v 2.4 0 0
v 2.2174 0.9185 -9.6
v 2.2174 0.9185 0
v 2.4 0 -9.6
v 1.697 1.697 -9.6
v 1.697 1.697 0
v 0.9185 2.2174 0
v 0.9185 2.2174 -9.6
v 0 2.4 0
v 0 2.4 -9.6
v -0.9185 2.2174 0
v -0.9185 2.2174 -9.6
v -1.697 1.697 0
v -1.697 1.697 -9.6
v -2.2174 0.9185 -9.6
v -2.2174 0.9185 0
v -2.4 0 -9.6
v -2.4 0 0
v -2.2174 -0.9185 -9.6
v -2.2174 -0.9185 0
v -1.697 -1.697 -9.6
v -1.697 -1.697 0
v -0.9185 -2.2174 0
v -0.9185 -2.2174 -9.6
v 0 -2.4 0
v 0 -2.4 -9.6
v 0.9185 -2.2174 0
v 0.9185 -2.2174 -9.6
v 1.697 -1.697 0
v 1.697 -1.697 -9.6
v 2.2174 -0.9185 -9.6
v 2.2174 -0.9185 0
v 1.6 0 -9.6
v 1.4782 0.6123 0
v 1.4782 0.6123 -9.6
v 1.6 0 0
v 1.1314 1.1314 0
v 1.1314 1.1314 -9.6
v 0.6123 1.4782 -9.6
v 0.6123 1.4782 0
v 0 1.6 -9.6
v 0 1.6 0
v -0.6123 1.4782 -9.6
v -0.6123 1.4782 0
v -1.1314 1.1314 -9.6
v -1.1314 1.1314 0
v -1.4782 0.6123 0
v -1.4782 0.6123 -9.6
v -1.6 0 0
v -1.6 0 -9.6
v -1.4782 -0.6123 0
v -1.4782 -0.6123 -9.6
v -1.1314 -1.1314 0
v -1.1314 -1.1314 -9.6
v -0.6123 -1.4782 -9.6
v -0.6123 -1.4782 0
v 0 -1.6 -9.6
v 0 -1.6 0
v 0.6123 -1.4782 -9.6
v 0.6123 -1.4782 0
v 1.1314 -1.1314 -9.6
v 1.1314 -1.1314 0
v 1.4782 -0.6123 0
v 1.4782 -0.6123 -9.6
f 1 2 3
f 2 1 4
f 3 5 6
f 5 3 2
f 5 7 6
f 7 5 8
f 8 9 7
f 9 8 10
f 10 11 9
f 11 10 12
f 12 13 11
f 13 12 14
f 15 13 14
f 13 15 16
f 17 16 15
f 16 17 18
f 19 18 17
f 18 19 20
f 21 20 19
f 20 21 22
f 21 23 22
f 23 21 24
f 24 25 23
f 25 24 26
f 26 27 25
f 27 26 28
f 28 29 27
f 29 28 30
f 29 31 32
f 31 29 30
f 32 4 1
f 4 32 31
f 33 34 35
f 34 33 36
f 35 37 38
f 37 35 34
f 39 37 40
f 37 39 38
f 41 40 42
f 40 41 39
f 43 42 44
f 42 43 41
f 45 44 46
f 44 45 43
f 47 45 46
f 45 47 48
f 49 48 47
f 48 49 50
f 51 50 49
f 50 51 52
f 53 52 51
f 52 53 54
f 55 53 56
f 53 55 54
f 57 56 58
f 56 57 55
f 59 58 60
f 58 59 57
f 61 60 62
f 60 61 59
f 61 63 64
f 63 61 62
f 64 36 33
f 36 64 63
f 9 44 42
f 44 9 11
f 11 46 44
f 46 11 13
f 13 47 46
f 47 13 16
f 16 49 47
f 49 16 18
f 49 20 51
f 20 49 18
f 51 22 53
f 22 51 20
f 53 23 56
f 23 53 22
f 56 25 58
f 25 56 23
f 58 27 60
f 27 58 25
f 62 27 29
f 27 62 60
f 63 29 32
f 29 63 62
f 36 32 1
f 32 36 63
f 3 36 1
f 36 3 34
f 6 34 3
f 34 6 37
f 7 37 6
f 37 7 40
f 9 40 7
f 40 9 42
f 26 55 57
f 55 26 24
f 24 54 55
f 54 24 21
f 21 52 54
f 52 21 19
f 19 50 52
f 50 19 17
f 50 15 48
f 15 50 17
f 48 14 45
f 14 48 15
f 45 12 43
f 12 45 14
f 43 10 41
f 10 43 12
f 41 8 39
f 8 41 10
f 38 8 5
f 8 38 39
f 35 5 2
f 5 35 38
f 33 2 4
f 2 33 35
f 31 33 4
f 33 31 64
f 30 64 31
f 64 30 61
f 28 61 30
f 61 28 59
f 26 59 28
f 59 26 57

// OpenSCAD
// file: ../p/4-4disc.scad
use <../lib.scad>
$fa=1; $fs=0.2;
function ldraw_lib__4_4disc(realsolid=false) = [
// 0 Disc 1.0
// 0 Name: 4-4disc.dat
// 0 Author: James Jessiman
// 0 !LDRAW_ORG Primitive UPDATE 2002-02
// 0 !LICENSE Licensed under CC BY 2.0 and CC BY 4.0 : see CAreadme.txt
// 
// 0 BFC CERTIFY CCW
  [0,"BFC","CERTIFY"],
  [0,"BFC","CCW"],
// 
// 0 !HISTORY 1998-12-15 [PTadmin] Official Update 1998-10
// 0 !HISTORY 2002-03-23 [sbliss] Added BFC statement
// 0 !HISTORY 2002-04-25 [PTadmin] Official Update 2002-02
// 0 !HISTORY 2007-06-24 [PTadmin] Header formatted for Contributor Agreement
// 0 !HISTORY 2008-07-01 [PTadmin] Official Update 2008-01
// 
// 
// 3 16 0 0 0 1 0 0 0.9239 0 0.3827
  [3,16,0,0,0,1,0,0,0.9239,0,0.3827],
// 3 16 0 0 0 0.9239 0 0.3827 0.7071 0 0.7071
  [3,16,0,0,0,0.9239,0,0.3827,0.7071,0,0.7071],
// 3 16 0 0 0 0.7071 0 0.7071 0.3827 0 0.9239
  [3,16,0,0,0,0.7071,0,0.7071,0.3827,0,0.9239],
// 3 16 0 0 0 0.3827 0 0.9239 0 0 1
  [3,16,0,0,0,0.3827,0,0.9239,0,0,1],
// 3 16 0 0 0 0 0 1 -0.3827 0 0.9239
  [3,16,0,0,0,0,0,1,-0.3827,0,0.9239],
// 3 16 0 0 0 -0.3827 0 0.9239 -0.7071 0 0.7071
  [3,16,0,0,0,-0.3827,0,0.9239,-0.7071,0,0.7071],
// 3 16 0 0 0 -0.7071 0 0.7071 -0.9239 0 0.3827
  [3,16,0,0,0,-0.7071,0,0.7071,-0.9239,0,0.3827],
// 3 16 0 0 0 -0.9239 0 0.3827 -1 0 -0
  [3,16,0,0,0,-0.9239,0,0.3827,-1,0,-0],
// 3 16 0 0 0 -1 0 -0 -0.9239 0 -0.3827
  [3,16,0,0,0,-1,0,-0,-0.9239,0,-0.3827],
// 3 16 0 0 0 -0.9239 0 -0.3827 -0.7071 0 -0.7071
  [3,16,0,0,0,-0.9239,0,-0.3827,-0.7071,0,-0.7071],
// 3 16 0 0 0 -0.7071 0 -0.7071 -0.3827 0 -0.9239
  [3,16,0,0,0,-0.7071,0,-0.7071,-0.3827,0,-0.9239],
// 3 16 0 0 0 -0.3827 0 -0.9239 0 0 -1
  [3,16,0,0,0,-0.3827,0,-0.9239,0,0,-1],
// 3 16 0 0 0 0 0 -1 0.3827 0 -0.9239
  [3,16,0,0,0,0,0,-1,0.3827,0,-0.9239],
// 3 16 0 0 0 0.3827 0 -0.9239 0.7071 0 -0.7071
  [3,16,0,0,0,0.3827,0,-0.9239,0.7071,0,-0.7071],
// 3 16 0 0 0 0.7071 0 -0.7071 0.9239 0 -0.3827
  [3,16,0,0,0,0.7071,0,-0.7071,0.9239,0,-0.3827],
// 3 16 0 0 0 0.9239 0 -0.3827 1 0 0
  [3,16,0,0,0,0.9239,0,-0.3827,1,0,0],
// 0
];
module ldraw_lib__4_4disc(step=0, col=false, unit=2/5, alt=false, line=0.2, solid=!$preview)
    makepoly(ldraw_lib__4_4disc(solid), step=step, col=col, unit=unit, alt=alt, line=line, solid=solid);
ldraw_lib__4_4disc(line=0.2);
// file: ../p/stud3.scad
use <../lib.scad>
use <4-4cyli.scad>
use <4-4disc.scad>
use <4-4edge.scad>
$fa=1; $fs=0.2;
function ldraw_lib__stud3(realsolid=false) = realsolid ? 
    [openscad(translate([0,0,-eps()], o=cylinder(4+eps(), r=4)),2)] : [
// 0 Stud Tube Solid
// 0 Name: stud3.dat
// 0 Author: James Jessiman
// 0 !LDRAW_ORG Primitive UPDATE 2012-01
// 0 !LICENSE Licensed under CC BY 2.0 and CC BY 4.0 : see CAreadme.txt
// 
// 0 BFC CERTIFY CCW
  [0,"BFC","CERTIFY"],
  [0,"BFC","CCW"],
// 
// 0 !HISTORY 2002-04-04 [sbliss] Modified for BFC compliance
// 0 !HISTORY 2002-04-25 [PTadmin] Official Update 2002-02
// 0 !HISTORY 2007-06-24 [PTadmin] Header formatted for Contributor Agreement
// 0 !HISTORY 2008-07-01 [PTadmin] Official Update 2008-01
// 0 !HISTORY 2012-02-16 [Philo] Changed to CCW
// 0 !HISTORY 2012-03-30 [PTadmin] Official Update 2012-01
// 
// 
// 1 16 0 -4 0 4 0 0 0 1 0 0 0 4 4-4edge.dat
  [1,16,0,-4,0,4,0,0,0,1,0,0,0,4, ldraw_lib__4_4edge(realsolid)],
// 1 16 0 0 0 4 0 0 0 1 0 0 0 4 4-4edge.dat
  [1,16,0,0,0,4,0,0,0,1,0,0,0,4, ldraw_lib__4_4edge(realsolid)],
// 1 16 0 -4 0 4 0 0 0 1 0 0 0 4 4-4disc.dat
  [1,16,0,-4,0,4,0,0,0,1,0,0,0,4, ldraw_lib__4_4disc(realsolid)],
// 1 16 0 -4 0 4 0 0 0 4 0 0 0 4 4-4cyli.dat
  [1,16,0,-4,0,4,0,0,0,4,0,0,0,4, ldraw_lib__4_4cyli(realsolid)],
];
module ldraw_lib__stud3(step=0, col=false, unit=2/5, alt=false, line=0.2, solid=!$preview)
    makepoly(ldraw_lib__stud3(solid), step=step, col=col, unit=unit, alt=alt, line=line, solid=solid);
ldraw_lib__stud3(line=0.2);
// file: ../p/stud.scad
use <../lib.scad>
use <4-4cyli.scad>
use <4-4disc.scad>
use <4-4edge.scad>
$fa=1; $fs=0.2;
function ldraw_lib__stud(realsolid=false) = realsolid ? 
    [openscad(translate([0,0,-eps()], o=cylinder(4+eps(), r=6)),2)] : [
// 0 Stud
// 0 Name: stud.dat
// 0 Author: James Jessiman
// 0 !LDRAW_ORG Primitive UPDATE 2012-01
// 0 !LICENSE Licensed under CC BY 2.0 and CC BY 4.0 : see CAreadme.txt
// 
// 0 BFC CERTIFY CCW
  [0,"BFC","CERTIFY"],
  [0,"BFC","CCW"],
// 
// 0 !HISTORY 2002-04-04 [sbliss] Modified for BFC compliance
// 0 !HISTORY 2002-04-25 [PTadmin] Official Update 2002-02
// 0 !HISTORY 2007-06-24 [PTadmin] Header formatted for Contributor Agreement
// 0 !HISTORY 2008-07-01 [PTadmin] Official Update 2008-01
// 0 !HISTORY 2012-02-16 [Philo] Changed to CCW
// 0 !HISTORY 2012-03-30 [PTadmin] Official Update 2012-01
// 
// 
// 1 16 0 0 0 6 0 0 0 1 0 0 0 6 4-4edge.dat
  [1,16,0,0,0,6,0,0,0,1,0,0,0,6, ldraw_lib__4_4edge(realsolid)],
// 1 16 0 -4 0 6 0 0 0 1 0 0 0 6 4-4edge.dat
  [1,16,0,-4,0,6,0,0,0,1,0,0,0,6, ldraw_lib__4_4edge(realsolid)],
// 1 16 0 0 0 6 0 0 0 -4 0 0 0 6 4-4cyli.dat
  [1,16,0,0,0,6,0,0,0,-4,0,0,0,6, ldraw_lib__4_4cyli(realsolid)],
// 1 16 0 -4 0 6 0 0 0 1 0 0 0 6 4-4disc.dat
  [1,16,0,-4,0,6,0,0,0,1,0,0,0,6, ldraw_lib__4_4disc(realsolid)],
];
module ldraw_lib__stud(step=0, col=false, unit=2/5, alt=false, line=0.2, solid=!$preview)
    makepoly(ldraw_lib__stud(solid), step=step, col=col, unit=unit, alt=alt, line=line, solid=solid);
ldraw_lib__stud(line=0.2);
// file: ../p/box5.scad
use <../lib.scad>
$fa=1; $fs=0.2;
function ldraw_lib__box5(realsolid=false) = [
// 0 Box with 5 Faces and All Edges
// 0 Name: box5.dat
// 0 Author: James Jessiman
// 0 !LDRAW_ORG Primitive UPDATE 2012-01
// 0 !LICENSE Licensed under CC BY 2.0 and CC BY 4.0 : see CAreadme.txt
// 
// 0 BFC CERTIFY CCW
  [0,"BFC","CERTIFY"],
  [0,"BFC","CCW"],
// 
// 0 !HISTORY 2002-04-03 [sbliss] Modified for BFC compliance
// 0 !HISTORY 2002-04-25 [PTadmin] Official Update 2002-02
// 0 !HISTORY 2007-06-24 [PTadmin] Header formatted for Contributor Agreement
// 0 !HISTORY 2008-07-01 [PTadmin] Official Update 2008-01
// 0 !HISTORY 2012-02-16 [Philo] Changed to CCW
// 0 !HISTORY 2012-03-30 [PTadmin] Official Update 2012-01
// 
// 
// 2 24 1 1 1 -1 1 1
  [2,24,1,1,1,-1,1,1],
// 2 24 -1 1 1 -1 1 -1
  [2,24,-1,1,1,-1,1,-1],
// 2 24 -1 1 -1 1 1 -1
  [2,24,-1,1,-1,1,1,-1],
// 2 24 1 1 -1 1 1 1
  [2,24,1,1,-1,1,1,1],
// 2 24 1 0 1 -1 0 1
  [2,24,1,0,1,-1,0,1],
// 2 24 -1 0 1 -1 0 -1
  [2,24,-1,0,1,-1,0,-1],
// 2 24 -1 0 -1 1 0 -1
  [2,24,-1,0,-1,1,0,-1],
// 2 24 1 0 -1 1 0 1
  [2,24,1,0,-1,1,0,1],
// 2 24 1 0 1 1 1 1
  [2,24,1,0,1,1,1,1],
// 2 24 -1 0 1 -1 1 1
  [2,24,-1,0,1,-1,1,1],
// 2 24 1 0 -1 1 1 -1
  [2,24,1,0,-1,1,1,-1],
// 2 24 -1 0 -1 -1 1 -1
  [2,24,-1,0,-1,-1,1,-1],
// 4 16 -1 1 1 1 1 1 1 1 -1 -1 1 -1
  [4,16,-1,1,1,1,1,1,1,1,-1,-1,1,-1],
// 4 16 -1 1 1 -1 0 1 1 0 1 1 1 1
  [4,16,-1,1,1,-1,0,1,1,0,1,1,1,1],
// 4 16 -1 1 -1 -1 0 -1 -1 0 1 -1 1 1
  [4,16,-1,1,-1,-1,0,-1,-1,0,1,-1,1,1],
// 4 16 1 1 -1 1 0 -1 -1 0 -1 -1 1 -1
  [4,16,1,1,-1,1,0,-1,-1,0,-1,-1,1,-1],
// 4 16 1 1 1 1 0 1 1 0 -1 1 1 -1
  [4,16,1,1,1,1,0,1,1,0,-1,1,1,-1],
];
module ldraw_lib__box5(step=0, col=false, unit=2/5, alt=false, line=0.2, solid=!$preview)
    makepoly(ldraw_lib__box5(solid), step=step, col=col, unit=unit, alt=alt, line=line, solid=solid);
ldraw_lib__box5(line=0.2);
// file: ../p/box4t.scad
use <../lib.scad>
$fa=1; $fs=0.2;
function ldraw_lib__box4t(realsolid=false) = [
// 0 Box with 4 Adjacent Faces and All Edges
// 0 Name: box4t.dat
// 0 Author: Tore Eriksson [Tore_Eriksson]
// 0 !LDRAW_ORG Primitive UPDATE 2003-02
// 0 !LICENSE Licensed under CC BY 2.0 and CC BY 4.0 : see CAreadme.txt
// 
// 0 BFC CERTIFY CCW
  [0,"BFC","CERTIFY"],
  [0,"BFC","CCW"],
// 
// 0 !HISTORY 1997-09-29 [PTadmin] Official Update 1997-15
// 0 !HISTORY 2002-08-31 [izanette] Modified with WINDZ for BFC compliance
// 0 !HISTORY 2003-08-01 [PTadmin] Official Update 2003-02
// 0 !HISTORY 2007-06-24 [PTadmin] Header formatted for Contributor Agreement
// 0 !HISTORY 2008-07-01 [PTadmin] Official Update 2008-01
// 
// 
// 2 24 1 1 1 -1 1 1
  [2,24,1,1,1,-1,1,1],
// 2 24 -1 1 1 -1 1 -1
  [2,24,-1,1,1,-1,1,-1],
// 2 24 -1 1 -1 1 1 -1
  [2,24,-1,1,-1,1,1,-1],
// 2 24 1 1 -1 1 1 1
  [2,24,1,1,-1,1,1,1],
// 2 24 1 0 1 -1 0 1
  [2,24,1,0,1,-1,0,1],
// 2 24 -1 0 1 -1 0 -1
  [2,24,-1,0,1,-1,0,-1],
// 2 24 -1 0 -1 1 0 -1
  [2,24,-1,0,-1,1,0,-1],
// 2 24 1 0 -1 1 0 1
  [2,24,1,0,-1,1,0,1],
// 2 24 1 0 1 1 1 1
  [2,24,1,0,1,1,1,1],
// 2 24 -1 0 1 -1 1 1
  [2,24,-1,0,1,-1,1,1],
// 2 24 1 0 -1 1 1 -1
  [2,24,1,0,-1,1,1,-1],
// 2 24 -1 0 -1 -1 1 -1
  [2,24,-1,0,-1,-1,1,-1],
// 4 16 1 1 1 1 1 -1 -1 1 -1 -1 1 1
  [4,16,1,1,1,1,1,-1,-1,1,-1,-1,1,1],
// 4 16 1 1 1 -1 1 1 -1 0 1 1 0 1
  [4,16,1,1,1,-1,1,1,-1,0,1,1,0,1],
// 4 16 -1 1 1 -1 1 -1 -1 0 -1 -1 0 1
  [4,16,-1,1,1,-1,1,-1,-1,0,-1,-1,0,1],
// 0 4 16 -1 1 -1 -1 0 -1 1 0 -1 1 1 -1
// 4 16 1 1 -1 1 1 1 1 0 1 1 0 -1
  [4,16,1,1,-1,1,1,1,1,0,1,1,0,-1],
// 0
];
module ldraw_lib__box4t(step=0, col=false, unit=2/5, alt=false, line=0.2, solid=!$preview)
    makepoly(ldraw_lib__box4t(solid), step=step, col=col, unit=unit, alt=alt, line=line, solid=solid);
ldraw_lib__box4t(line=0.2);
// file: s/3004s01.scad
use <../../lib.scad>
use <../../p/box4t.scad>
use <../../p/box5.scad>
use <../../p/stud.scad>
use <../../p/stud3.scad>
$fa=1; $fs=0.2;
function ldraw_lib__s__3004s01(realsolid=false) = [
// 0 ~Brick  1 x  2 without Front Face
// 0 Name: s\3004s01.dat
// 0 Author: James Jessiman
// 0 !LDRAW_ORG Subpart UPDATE 2003-03
// 0 !LICENSE Licensed under CC BY 2.0 and CC BY 4.0 : see CAreadme.txt
// 
// 0 BFC CERTIFY CCW
  [0,"BFC","CERTIFY"],
  [0,"BFC","CCW"],
// 
// 0 !HISTORY 2003-09-07 [jriley] Subfiling, BFC
// 0 !HISTORY 2003-12-19 [PTadmin] Official Update 2003-03
// 0 !HISTORY 2007-08-29 [PTadmin] Header formatted for Contributor Agreement
// 0 !HISTORY 2008-07-01 [PTadmin] Official Update 2008-01
// 
// 
// 1 16 0 4 0 1 0 0 0 -5 0 0 0 1 stud3.dat
  [1,16,0,4,0,1,0,0,0,-5,0,0,0,1, ldraw_lib__stud3(realsolid)],
// 0 BFC INVERTNEXT
  [0,"BFC","INVERTNEXT"],
// 1 16 0 24 0 16 0 0 0 -20 0 0 0 6 box5.dat
  [1,16,0,24,0,16,0,0,0,-20,0,0,0,6, ldraw_lib__box5(realsolid)],
// 4 16 20 24 10 16 24 6 -16 24 6 -20 24 10
  [4,16,20,24,10,16,24,6,-16,24,6,-20,24,10],
// 4 16 -20 24 10 -16 24 6 -16 24 -6 -20 24 -10
  [4,16,-20,24,10,-16,24,6,-16,24,-6,-20,24,-10],
// 4 16 -20 24 -10 -16 24 -6 16 24 -6 20 24 -10
  [4,16,-20,24,-10,-16,24,-6,16,24,-6,20,24,-10],
// 4 16 20 24 -10 16 24 -6 16 24 6 20 24 10
  [4,16,20,24,-10,16,24,-6,16,24,6,20,24,10],
// 1 16 0 24 0 20 0 0 0 -24 0 0 0 10 box4t.dat
  [1,16,0,24,0,20,0,0,0,-24,0,0,0,10, ldraw_lib__box4t(realsolid)],
// 1 16 10 0 0 1 0 0 0 1 0 0 0 1 stud.dat
  [1,16,10,0,0,1,0,0,0,1,0,0,0,1, ldraw_lib__stud(realsolid)],
// 1 16 -10 0 0 1 0 0 0 1 0 0 0 1 stud.dat
  [1,16,-10,0,0,1,0,0,0,1,0,0,0,1, ldraw_lib__stud(realsolid)],
// 0
];
module ldraw_lib__s__3004s01(step=0, col=false, unit=2/5, alt=false, line=0.2, solid=!$preview)
    makepoly(ldraw_lib__s__3004s01(solid), step=step, col=col, unit=unit, alt=alt, line=line, solid=solid);
ldraw_lib__s__3004s01(line=0.2);
// file: 3004.scad
use <../lib.scad>
use <s/3004s01.scad>
$fa=1; $fs=0.2;
function ldraw_lib__3004(realsolid=false) = [
// 0 Brick  1 x  2
// 0 Name: 3004.dat
// 0 Author: James Jessiman
// 0 !LDRAW_ORG Part UPDATE 2022-05
// 0 !LICENSE Licensed under CC BY 2.0 and CC BY 4.0 : see CAreadme.txt
// 
// 0 BFC CERTIFY CCW
  [0,"BFC","CERTIFY"],
  [0,"BFC","CCW"],
// 
// 0 !HISTORY 2001-10-26 [PTadmin] Official Update 2001-01
// 0 !HISTORY 2002-05-07 {unknown} BFC Certification
// 0 !HISTORY 2002-06-11 [PTadmin] Official Update 2002-03
// 0 !HISTORY 2007-05-07 [PTadmin] Header formatted for Contributor Agreement
// 0 !HISTORY 2008-07-01 [PTadmin] Official Update 2008-01
// 0 !HISTORY 2022-08-04 [MagFors] Using subfile
// 0 !HISTORY 2022-09-15 [PTadmin] Official Update 2022-05
// 
// 
// 1 16 0 0 0 1 0 0 0 1 0 0 0 1 s\3004s01.dat
  [1,16,0,0,0,1,0,0,0,1,0,0,0,1, ldraw_lib__s__3004s01(realsolid)],
// 4 16 -20 24 -10 20 24 -10 20 0 -10 -20 0 -10
  [4,16,-20,24,-10,20,24,-10,20,0,-10,-20,0,-10],
];
module ldraw_lib__3004(step=0, col=false, unit=2/5, alt=false, line=0.2, solid=!$preview)
    makepoly(ldraw_lib__3004(solid), step=step, col=col, unit=unit, alt=alt, line=line, solid=solid);
ldraw_lib__3004(line=0.2);
// file: ../p/4-4ring2.scad
use <../lib.scad>
$fa=1; $fs=0.2;
function ldraw_lib__4_4ring2(realsolid=false) = [
// 0 Ring  2 x 1.0
// 0 Name: 4-4ring2.dat
// 0 Author: James Jessiman
// 0 !LDRAW_ORG Primitive UPDATE 2009-01
// 0 !LICENSE Licensed under CC BY 2.0 and CC BY 4.0 : see CAreadme.txt
// 
// 0 BFC CERTIFY CCW
  [0,"BFC","CERTIFY"],
  [0,"BFC","CCW"],
// 
// 0 !HISTORY 1998-12-15 [PTadmin] Official Update 1998-10
// 0 !HISTORY 2002-04-05 [hafhead] Added BFC statement
// 0 !HISTORY 2002-04-25 [PTadmin] Official Update 2002-02
// 0 !HISTORY 2007-06-24 [PTadmin] Header formatted for Contributor Agreement
// 0 !HISTORY 2008-07-01 [PTadmin] Official Update 2008-01
// 0 !HISTORY 2008-08-26 [cwdee] Switch polygon winding and rename
// 0 !HISTORY 2009-05-02 [PTadmin] Official Update 2009-01
// 
// 
// 4 16 -1.1481 0 2.7717 -0.7654 0 1.8478 0 0 2 0 0 3
  [4,16,-1.1481,0,2.7717,-0.7654,0,1.8478,0,0,2,0,0,3],
// 4 16 -2.1213 0 2.1213 -1.4142 0 1.4142 -0.7654 0 1.8478 -1.1481 0 2.7717
  [4,16,-2.1213,0,2.1213,-1.4142,0,1.4142,-0.7654,0,1.8478,-1.1481,0,2.7717],
// 4 16 -2.7717 0 1.1481 -1.8478 0 0.7654 -1.4142 0 1.4142 -2.1213 0 2.1213
  [4,16,-2.7717,0,1.1481,-1.8478,0,0.7654,-1.4142,0,1.4142,-2.1213,0,2.1213],
// 4 16 -3 0 0 -2 0 0 -1.8478 0 0.7654 -2.7717 0 1.1481
  [4,16,-3,0,0,-2,0,0,-1.8478,0,0.7654,-2.7717,0,1.1481],
// 4 16 -2.7717 0 -1.1481 -1.8478 0 -0.7654 -2 0 0 -3 0 0
  [4,16,-2.7717,0,-1.1481,-1.8478,0,-0.7654,-2,0,0,-3,0,0],
// 4 16 -2.1213 0 -2.1213 -1.4142 0 -1.4142 -1.8478 0 -0.7654 -2.7717 0 -1.1481
  [4,16,-2.1213,0,-2.1213,-1.4142,0,-1.4142,-1.8478,0,-0.7654,-2.7717,0,-1.1481],
// 4 16 -1.1481 0 -2.7717 -0.7654 0 -1.8478 -1.4142 0 -1.4142 -2.1213 0 -2.1213
  [4,16,-1.1481,0,-2.7717,-0.7654,0,-1.8478,-1.4142,0,-1.4142,-2.1213,0,-2.1213],
// 4 16 0 0 -3 0 0 -2 -0.7654 0 -1.8478 -1.1481 0 -2.7717
  [4,16,0,0,-3,0,0,-2,-0.7654,0,-1.8478,-1.1481,0,-2.7717],
// 4 16 1.1481 0 -2.7717 0.7654 0 -1.8478 0 0 -2 0 0 -3
  [4,16,1.1481,0,-2.7717,0.7654,0,-1.8478,0,0,-2,0,0,-3],
// 4 16 2.1213 0 -2.1213 1.4142 0 -1.4142 0.7654 0 -1.8478 1.1481 0 -2.7717
  [4,16,2.1213,0,-2.1213,1.4142,0,-1.4142,0.7654,0,-1.8478,1.1481,0,-2.7717],
// 4 16 2.7717 0 -1.1481 1.8478 0 -0.7654 1.4142 0 -1.4142 2.1213 0 -2.1213
  [4,16,2.7717,0,-1.1481,1.8478,0,-0.7654,1.4142,0,-1.4142,2.1213,0,-2.1213],
// 4 16 3 0 0 2 0 0 1.8478 0 -0.7654 2.7717 0 -1.1481
  [4,16,3,0,0,2,0,0,1.8478,0,-0.7654,2.7717,0,-1.1481],
// 4 16 2.7717 0 1.1481 1.8478 0 0.7654 2 0 0 3 0 0
  [4,16,2.7717,0,1.1481,1.8478,0,0.7654,2,0,0,3,0,0],
// 4 16 2.1213 0 2.1213 1.4142 0 1.4142 1.8478 0 0.7654 2.7717 0 1.1481
  [4,16,2.1213,0,2.1213,1.4142,0,1.4142,1.8478,0,0.7654,2.7717,0,1.1481],
// 4 16 1.1481 0 2.7717 0.7654 0 1.8478 1.4142 0 1.4142 2.1213 0 2.1213
  [4,16,1.1481,0,2.7717,0.7654,0,1.8478,1.4142,0,1.4142,2.1213,0,2.1213],
// 4 16 0 0 3 0 0 2 0.7654 0 1.8478 1.1481 0 2.7717
  [4,16,0,0,3,0,0,2,0.7654,0,1.8478,1.1481,0,2.7717],
// 0
];
module ldraw_lib__4_4ring2(step=0, col=false, unit=2/5, alt=false, line=0.2, solid=!$preview)
    makepoly(ldraw_lib__4_4ring2(solid), step=step, col=col, unit=unit, alt=alt, line=line, solid=solid);
ldraw_lib__4_4ring2(line=0.2);
// file: ../p/4-4edge.scad
use <../lib.scad>
$fa=1; $fs=0.2;
function ldraw_lib__4_4edge(realsolid=false) = [
// 0 Circle 1.0
// 0 Name: 4-4edge.dat
// 0 Author: James Jessiman
// 0 !LDRAW_ORG Primitive UPDATE 2017-01
// 0 !LICENSE Licensed under CC BY 2.0 and CC BY 4.0 : see CAreadme.txt
// 
// 0 BFC CERTIFY CCW
  [0,"BFC","CERTIFY"],
  [0,"BFC","CCW"],
// 
// 0 !HISTORY 1998-12-15 [PTadmin] Official Update 1998-10
// 0 !HISTORY 2005-12-28 [PTadmin] Official Update 2005-01
// 0 !HISTORY 2007-06-24 [PTadmin] Header formatted for Contributor Agreement
// 0 !HISTORY 2008-07-01 [PTadmin] Official Update 2008-01
// 0 !HISTORY 2017-01-15 [Steffen] BFCed
// 0 !HISTORY 2017-12-30 [PTadmin] Official Update 2017-01
// 
// 
// 2 24 1 0 0 0.9239 0 0.3827
  [2,24,1,0,0,0.9239,0,0.3827],
// 2 24 0.9239 0 0.3827 0.7071 0 0.7071
  [2,24,0.9239,0,0.3827,0.7071,0,0.7071],
// 2 24 0.7071 0 0.7071 0.3827 0 0.9239
  [2,24,0.7071,0,0.7071,0.3827,0,0.9239],
// 2 24 0.3827 0 0.9239 0 0 1
  [2,24,0.3827,0,0.9239,0,0,1],
// 2 24 0 0 1 -0.3827 0 0.9239
  [2,24,0,0,1,-0.3827,0,0.9239],
// 2 24 -0.3827 0 0.9239 -0.7071 0 0.7071
  [2,24,-0.3827,0,0.9239,-0.7071,0,0.7071],
// 2 24 -0.7071 0 0.7071 -0.9239 0 0.3827
  [2,24,-0.7071,0,0.7071,-0.9239,0,0.3827],
// 2 24 -0.9239 0 0.3827 -1 0 -0
  [2,24,-0.9239,0,0.3827,-1,0,-0],
// 2 24 -1 0 -0 -0.9239 0 -0.3827
  [2,24,-1,0,-0,-0.9239,0,-0.3827],
// 2 24 -0.9239 0 -0.3827 -0.7071 0 -0.7071
  [2,24,-0.9239,0,-0.3827,-0.7071,0,-0.7071],
// 2 24 -0.7071 0 -0.7071 -0.3827 0 -0.9239
  [2,24,-0.7071,0,-0.7071,-0.3827,0,-0.9239],
// 2 24 -0.3827 0 -0.9239 0 0 -1
  [2,24,-0.3827,0,-0.9239,0,0,-1],
// 2 24 0 0 -1 0.3827 0 -0.9239
  [2,24,0,0,-1,0.3827,0,-0.9239],
// 2 24 0.3827 0 -0.9239 0.7071 0 -0.7071
  [2,24,0.3827,0,-0.9239,0.7071,0,-0.7071],
// 2 24 0.7071 0 -0.7071 0.9239 0 -0.3827
  [2,24,0.7071,0,-0.7071,0.9239,0,-0.3827],
// 2 24 0.9239 0 -0.3827 1 0 0
  [2,24,0.9239,0,-0.3827,1,0,0],
];
module ldraw_lib__4_4edge(step=0, col=false, unit=2/5, alt=false, line=0.2, solid=!$preview)
    makepoly(ldraw_lib__4_4edge(solid), step=step, col=col, unit=unit, alt=alt, line=line, solid=solid);
ldraw_lib__4_4edge(line=0.2);
// file: ../p/4-4cyli.scad
use <../lib.scad>
$fa=1; $fs=0.2;
function ldraw_lib__4_4cyli(realsolid=false) = [
// 0 Cylinder 1.0
// 0 Name: 4-4cyli.dat
// 0 Author: James Jessiman
// 0 !LDRAW_ORG Primitive UPDATE 2005-01
// 0 !LICENSE Licensed under CC BY 2.0 and CC BY 4.0 : see CAreadme.txt
// 
// 0 BFC CERTIFY CCW
  [0,"BFC","CERTIFY"],
  [0,"BFC","CCW"],
// 
// 0 !HISTORY 1998-12-15 [PTadmin] Official Update 1998-10
// 0 !HISTORY 2002-03-23 [sbliss] Added BFC statement; merged headers from files in distributions LDraw 0.27 and Complete.
// 0 !HISTORY 2002-04-25 [PTadmin] Official Update 2002-02
// 0 !HISTORY 2004-12-14 [guyvivan] BFC CCW
// 0 !HISTORY 2005-12-28 [PTadmin] Official Update 2005-01
// 0 !HISTORY 2007-06-24 [PTadmin] Header formatted for Contributor Agreement
// 0 !HISTORY 2008-07-01 [PTadmin] Official Update 2008-01
// 
// 
// 4 16 1 1 0 0.9239 1 0.3827 0.9239 0 0.3827 1 0 0
  [4,16,1,1,0,0.9239,1,0.3827,0.9239,0,0.3827,1,0,0],
// 5 24 1 0 0 1 1 0 0.9239 0 0.3827 0.9239 0 -0.3827
  [5,24,1,0,0,1,1,0,0.9239,0,0.3827,0.9239,0,-0.3827],
// 4 16 0.9239 1 0.3827 0.7071 1 0.7071 0.7071 0 0.7071 0.9239 0 0.3827
  [4,16,0.9239,1,0.3827,0.7071,1,0.7071,0.7071,0,0.7071,0.9239,0,0.3827],
// 5 24 0.9239 0 0.3827 0.9239 1 0.3827 0.7071 0 0.7071 1 0 0
  [5,24,0.9239,0,0.3827,0.9239,1,0.3827,0.7071,0,0.7071,1,0,0],
// 4 16 0.7071 1 0.7071 0.3827 1 0.9239 0.3827 0 0.9239 0.7071 0 0.7071
  [4,16,0.7071,1,0.7071,0.3827,1,0.9239,0.3827,0,0.9239,0.7071,0,0.7071],
// 5 24 0.7071 0 0.7071 0.7071 1 0.7071 0.3827 0 0.9239 0.9239 0 0.3827
  [5,24,0.7071,0,0.7071,0.7071,1,0.7071,0.3827,0,0.9239,0.9239,0,0.3827],
// 4 16 0.3827 1 0.9239 0 1 1 0 0 1 0.3827 0 0.9239
  [4,16,0.3827,1,0.9239,0,1,1,0,0,1,0.3827,0,0.9239],
// 5 24 0.3827 0 0.9239 0.3827 1 0.9239 0 0 1 0.7071 0 0.7071
  [5,24,0.3827,0,0.9239,0.3827,1,0.9239,0,0,1,0.7071,0,0.7071],
// 4 16 0 1 1 -0.3827 1 0.9239 -0.3827 0 0.9239 0 0 1
  [4,16,0,1,1,-0.3827,1,0.9239,-0.3827,0,0.9239,0,0,1],
// 5 24 0 0 1 0 1 1 -0.3827 0 0.9239 0.3827 0 0.9239
  [5,24,0,0,1,0,1,1,-0.3827,0,0.9239,0.3827,0,0.9239],
// 4 16 -0.3827 1 0.9239 -0.7071 1 0.7071 -0.7071 0 0.7071 -0.3827 0 0.9239
  [4,16,-0.3827,1,0.9239,-0.7071,1,0.7071,-0.7071,0,0.7071,-0.3827,0,0.9239],
// 5 24 -0.3827 0 0.9239 -0.3827 1 0.9239 -0.7071 0 0.7071 0 0 1
  [5,24,-0.3827,0,0.9239,-0.3827,1,0.9239,-0.7071,0,0.7071,0,0,1],
// 4 16 -0.7071 1 0.7071 -0.9239 1 0.3827 -0.9239 0 0.3827 -0.7071 0 0.7071
  [4,16,-0.7071,1,0.7071,-0.9239,1,0.3827,-0.9239,0,0.3827,-0.7071,0,0.7071],
// 5 24 -0.7071 0 0.7071 -0.7071 1 0.7071 -0.9239 0 0.3827 -0.3827 0 0.9239
  [5,24,-0.7071,0,0.7071,-0.7071,1,0.7071,-0.9239,0,0.3827,-0.3827,0,0.9239],
// 4 16 -0.9239 1 0.3827 -1 1 0 -1 0 0 -0.9239 0 0.3827
  [4,16,-0.9239,1,0.3827,-1,1,0,-1,0,0,-0.9239,0,0.3827],
// 5 24 -0.9239 0 0.3827 -0.9239 1 0.3827 -1 0 0 -0.7071 0 0.7071
  [5,24,-0.9239,0,0.3827,-0.9239,1,0.3827,-1,0,0,-0.7071,0,0.7071],
// 4 16 -1 1 0 -0.9239 1 -0.3827 -0.9239 0 -0.3827 -1 0 0
  [4,16,-1,1,0,-0.9239,1,-0.3827,-0.9239,0,-0.3827,-1,0,0],
// 5 24 -1 0 0 -1 1 0 -0.9239 0 -0.3827 -0.9239 0 0.3827
  [5,24,-1,0,0,-1,1,0,-0.9239,0,-0.3827,-0.9239,0,0.3827],
// 4 16 -0.9239 1 -0.3827 -0.7071 1 -0.7071 -0.7071 0 -0.7071 -0.9239 0 -0.3827
  [4,16,-0.9239,1,-0.3827,-0.7071,1,-0.7071,-0.7071,0,-0.7071,-0.9239,0,-0.3827],
// 5 24 -0.9239 0 -0.3827 -0.9239 1 -0.3827 -0.7071 0 -0.7071 -1 0 0
  [5,24,-0.9239,0,-0.3827,-0.9239,1,-0.3827,-0.7071,0,-0.7071,-1,0,0],
// 4 16 -0.7071 1 -0.7071 -0.3827 1 -0.9239 -0.3827 0 -0.9239 -0.7071 0 -0.7071
  [4,16,-0.7071,1,-0.7071,-0.3827,1,-0.9239,-0.3827,0,-0.9239,-0.7071,0,-0.7071],
// 5 24 -0.7071 0 -0.7071 -0.7071 1 -0.7071 -0.3827 0 -0.9239 -0.9239 0 -0.3827
  [5,24,-0.7071,0,-0.7071,-0.7071,1,-0.7071,-0.3827,0,-0.9239,-0.9239,0,-0.3827],
// 4 16 -0.3827 1 -0.9239 0 1 -1 0 0 -1 -0.3827 0 -0.9239
  [4,16,-0.3827,1,-0.9239,0,1,-1,0,0,-1,-0.3827,0,-0.9239],
// 5 24 -0.3827 0 -0.9239 -0.3827 1 -0.9239 0 0 -1 -0.7071 0 -0.7071
  [5,24,-0.3827,0,-0.9239,-0.3827,1,-0.9239,0,0,-1,-0.7071,0,-0.7071],
// 4 16 0 1 -1 0.3827 1 -0.9239 0.3827 0 -0.9239 0 0 -1
  [4,16,0,1,-1,0.3827,1,-0.9239,0.3827,0,-0.9239,0,0,-1],
// 5 24 0 0 -1 0 1 -1 0.3827 0 -0.9239 -0.3827 0 -0.9239
  [5,24,0,0,-1,0,1,-1,0.3827,0,-0.9239,-0.3827,0,-0.9239],
// 4 16 0.3827 1 -0.9239 0.7071 1 -0.7071 0.7071 0 -0.7071 0.3827 0 -0.9239
  [4,16,0.3827,1,-0.9239,0.7071,1,-0.7071,0.7071,0,-0.7071,0.3827,0,-0.9239],
// 5 24 0.3827 0 -0.9239 0.3827 1 -0.9239 0.7071 0 -0.7071 0 0 -1
  [5,24,0.3827,0,-0.9239,0.3827,1,-0.9239,0.7071,0,-0.7071,0,0,-1],
// 4 16 0.7071 1 -0.7071 0.9239 1 -0.3827 0.9239 0 -0.3827 0.7071 0 -0.7071
  [4,16,0.7071,1,-0.7071,0.9239,1,-0.3827,0.9239,0,-0.3827,0.7071,0,-0.7071],
// 5 24 0.7071 0 -0.7071 0.7071 1 -0.7071 0.9239 0 -0.3827 0.3827 0 -0.9239
  [5,24,0.7071,0,-0.7071,0.7071,1,-0.7071,0.9239,0,-0.3827,0.3827,0,-0.9239],
// 4 16 0.9239 1 -0.3827 1 1 0 1 0 0 0.9239 0 -0.3827
  [4,16,0.9239,1,-0.3827,1,1,0,1,0,0,0.9239,0,-0.3827],
// 5 24 0.9239 0 -0.3827 0.9239 1 -0.3827 1 0 0 0.7071 0 -0.7071
  [5,24,0.9239,0,-0.3827,0.9239,1,-0.3827,1,0,0,0.7071,0,-0.7071],
// 0
];
module ldraw_lib__4_4cyli(step=0, col=false, unit=2/5, alt=false, line=0.2, solid=!$preview)
    makepoly(ldraw_lib__4_4cyli(solid), step=step, col=col, unit=unit, alt=alt, line=line, solid=solid);
ldraw_lib__4_4cyli(line=0.2);
// main file
use <../lib.scad>
use <../p/4-4cyli.scad>
use <../p/4-4edge.scad>
use <../p/4-4ring2.scad>
$fa=1; $fs=0.2;
function ldraw_lib__u9226(realsolid=false) = [
// 0 ~Train Track 12V Tapered Point Vertical Axle
// 0 Name: u9226.dat
// 0 Author: Steffen [Steffen]
// 0 !LDRAW_ORG Part UPDATE 2012-01
// 0 !LICENSE Licensed under CC BY 2.0 and CC BY 4.0 : see CAreadme.txt
// 
// 0 BFC CERTIFY CCW
  [0,"BFC","CERTIFY"],
  [0,"BFC","CCW"],
// 
// 0 !CMDLINE -c79
// 
// 0 !HISTORY 2012-03-30 [PTadmin] Official Update 2012-01
// 
// 
// 1 16 0 0 0 6 0 0 0 24 0 0 0 6 4-4cyli.dat
  [1,16,0,0,0,6,0,0,0,24,0,0,0,6, ldraw_lib__4_4cyli(realsolid)],
// 1 16 0 0 0 6 0 0 0 22 0 0 0 6 4-4edge.dat
  [1,16,0,0,0,6,0,0,0,22,0,0,0,6, ldraw_lib__4_4edge(realsolid)],
// 1 16 0 0 0 4 0 0 0 22 0 0 0 4 4-4edge.dat
  [1,16,0,0,0,4,0,0,0,22,0,0,0,4, ldraw_lib__4_4edge(realsolid)],
// 1 16 0 24 0 6 0 0 0 22 0 0 0 6 4-4edge.dat
  [1,16,0,24,0,6,0,0,0,22,0,0,0,6, ldraw_lib__4_4edge(realsolid)],
// 1 16 0 24 0 4 0 0 0 22 0 0 0 4 4-4edge.dat
  [1,16,0,24,0,4,0,0,0,22,0,0,0,4, ldraw_lib__4_4edge(realsolid)],
// 0 BFC INVERTNEXT
  [0,"BFC","INVERTNEXT"],
// 1 16 0 0 0 4 0 0 0 24 0 0 0 4 4-4cyli.dat
  [1,16,0,0,0,4,0,0,0,24,0,0,0,4, ldraw_lib__4_4cyli(realsolid)],
// 1 16 0 0 0 2 0 0 0 1 0 0 0 2 4-4ring2.dat
  [1,16,0,0,0,2,0,0,0,1,0,0,0,2, ldraw_lib__4_4ring2(realsolid)],
// 1 16 0 24 0 2 0 0 0 -1 0 0 0 -2 4-4ring2.dat
  [1,16,0,24,0,2,0,0,0,-1,0,0,0,-2, ldraw_lib__4_4ring2(realsolid)],
];
module ldraw_lib__u9226(step=0, col=false, unit=2/5, alt=false, line=0.2, solid=!$preview)
    makepoly(ldraw_lib__u9226(solid), step=step, col=col, unit=unit, alt=alt, line=line, solid=solid);
ldraw_lib__u9226(line=0.2);
